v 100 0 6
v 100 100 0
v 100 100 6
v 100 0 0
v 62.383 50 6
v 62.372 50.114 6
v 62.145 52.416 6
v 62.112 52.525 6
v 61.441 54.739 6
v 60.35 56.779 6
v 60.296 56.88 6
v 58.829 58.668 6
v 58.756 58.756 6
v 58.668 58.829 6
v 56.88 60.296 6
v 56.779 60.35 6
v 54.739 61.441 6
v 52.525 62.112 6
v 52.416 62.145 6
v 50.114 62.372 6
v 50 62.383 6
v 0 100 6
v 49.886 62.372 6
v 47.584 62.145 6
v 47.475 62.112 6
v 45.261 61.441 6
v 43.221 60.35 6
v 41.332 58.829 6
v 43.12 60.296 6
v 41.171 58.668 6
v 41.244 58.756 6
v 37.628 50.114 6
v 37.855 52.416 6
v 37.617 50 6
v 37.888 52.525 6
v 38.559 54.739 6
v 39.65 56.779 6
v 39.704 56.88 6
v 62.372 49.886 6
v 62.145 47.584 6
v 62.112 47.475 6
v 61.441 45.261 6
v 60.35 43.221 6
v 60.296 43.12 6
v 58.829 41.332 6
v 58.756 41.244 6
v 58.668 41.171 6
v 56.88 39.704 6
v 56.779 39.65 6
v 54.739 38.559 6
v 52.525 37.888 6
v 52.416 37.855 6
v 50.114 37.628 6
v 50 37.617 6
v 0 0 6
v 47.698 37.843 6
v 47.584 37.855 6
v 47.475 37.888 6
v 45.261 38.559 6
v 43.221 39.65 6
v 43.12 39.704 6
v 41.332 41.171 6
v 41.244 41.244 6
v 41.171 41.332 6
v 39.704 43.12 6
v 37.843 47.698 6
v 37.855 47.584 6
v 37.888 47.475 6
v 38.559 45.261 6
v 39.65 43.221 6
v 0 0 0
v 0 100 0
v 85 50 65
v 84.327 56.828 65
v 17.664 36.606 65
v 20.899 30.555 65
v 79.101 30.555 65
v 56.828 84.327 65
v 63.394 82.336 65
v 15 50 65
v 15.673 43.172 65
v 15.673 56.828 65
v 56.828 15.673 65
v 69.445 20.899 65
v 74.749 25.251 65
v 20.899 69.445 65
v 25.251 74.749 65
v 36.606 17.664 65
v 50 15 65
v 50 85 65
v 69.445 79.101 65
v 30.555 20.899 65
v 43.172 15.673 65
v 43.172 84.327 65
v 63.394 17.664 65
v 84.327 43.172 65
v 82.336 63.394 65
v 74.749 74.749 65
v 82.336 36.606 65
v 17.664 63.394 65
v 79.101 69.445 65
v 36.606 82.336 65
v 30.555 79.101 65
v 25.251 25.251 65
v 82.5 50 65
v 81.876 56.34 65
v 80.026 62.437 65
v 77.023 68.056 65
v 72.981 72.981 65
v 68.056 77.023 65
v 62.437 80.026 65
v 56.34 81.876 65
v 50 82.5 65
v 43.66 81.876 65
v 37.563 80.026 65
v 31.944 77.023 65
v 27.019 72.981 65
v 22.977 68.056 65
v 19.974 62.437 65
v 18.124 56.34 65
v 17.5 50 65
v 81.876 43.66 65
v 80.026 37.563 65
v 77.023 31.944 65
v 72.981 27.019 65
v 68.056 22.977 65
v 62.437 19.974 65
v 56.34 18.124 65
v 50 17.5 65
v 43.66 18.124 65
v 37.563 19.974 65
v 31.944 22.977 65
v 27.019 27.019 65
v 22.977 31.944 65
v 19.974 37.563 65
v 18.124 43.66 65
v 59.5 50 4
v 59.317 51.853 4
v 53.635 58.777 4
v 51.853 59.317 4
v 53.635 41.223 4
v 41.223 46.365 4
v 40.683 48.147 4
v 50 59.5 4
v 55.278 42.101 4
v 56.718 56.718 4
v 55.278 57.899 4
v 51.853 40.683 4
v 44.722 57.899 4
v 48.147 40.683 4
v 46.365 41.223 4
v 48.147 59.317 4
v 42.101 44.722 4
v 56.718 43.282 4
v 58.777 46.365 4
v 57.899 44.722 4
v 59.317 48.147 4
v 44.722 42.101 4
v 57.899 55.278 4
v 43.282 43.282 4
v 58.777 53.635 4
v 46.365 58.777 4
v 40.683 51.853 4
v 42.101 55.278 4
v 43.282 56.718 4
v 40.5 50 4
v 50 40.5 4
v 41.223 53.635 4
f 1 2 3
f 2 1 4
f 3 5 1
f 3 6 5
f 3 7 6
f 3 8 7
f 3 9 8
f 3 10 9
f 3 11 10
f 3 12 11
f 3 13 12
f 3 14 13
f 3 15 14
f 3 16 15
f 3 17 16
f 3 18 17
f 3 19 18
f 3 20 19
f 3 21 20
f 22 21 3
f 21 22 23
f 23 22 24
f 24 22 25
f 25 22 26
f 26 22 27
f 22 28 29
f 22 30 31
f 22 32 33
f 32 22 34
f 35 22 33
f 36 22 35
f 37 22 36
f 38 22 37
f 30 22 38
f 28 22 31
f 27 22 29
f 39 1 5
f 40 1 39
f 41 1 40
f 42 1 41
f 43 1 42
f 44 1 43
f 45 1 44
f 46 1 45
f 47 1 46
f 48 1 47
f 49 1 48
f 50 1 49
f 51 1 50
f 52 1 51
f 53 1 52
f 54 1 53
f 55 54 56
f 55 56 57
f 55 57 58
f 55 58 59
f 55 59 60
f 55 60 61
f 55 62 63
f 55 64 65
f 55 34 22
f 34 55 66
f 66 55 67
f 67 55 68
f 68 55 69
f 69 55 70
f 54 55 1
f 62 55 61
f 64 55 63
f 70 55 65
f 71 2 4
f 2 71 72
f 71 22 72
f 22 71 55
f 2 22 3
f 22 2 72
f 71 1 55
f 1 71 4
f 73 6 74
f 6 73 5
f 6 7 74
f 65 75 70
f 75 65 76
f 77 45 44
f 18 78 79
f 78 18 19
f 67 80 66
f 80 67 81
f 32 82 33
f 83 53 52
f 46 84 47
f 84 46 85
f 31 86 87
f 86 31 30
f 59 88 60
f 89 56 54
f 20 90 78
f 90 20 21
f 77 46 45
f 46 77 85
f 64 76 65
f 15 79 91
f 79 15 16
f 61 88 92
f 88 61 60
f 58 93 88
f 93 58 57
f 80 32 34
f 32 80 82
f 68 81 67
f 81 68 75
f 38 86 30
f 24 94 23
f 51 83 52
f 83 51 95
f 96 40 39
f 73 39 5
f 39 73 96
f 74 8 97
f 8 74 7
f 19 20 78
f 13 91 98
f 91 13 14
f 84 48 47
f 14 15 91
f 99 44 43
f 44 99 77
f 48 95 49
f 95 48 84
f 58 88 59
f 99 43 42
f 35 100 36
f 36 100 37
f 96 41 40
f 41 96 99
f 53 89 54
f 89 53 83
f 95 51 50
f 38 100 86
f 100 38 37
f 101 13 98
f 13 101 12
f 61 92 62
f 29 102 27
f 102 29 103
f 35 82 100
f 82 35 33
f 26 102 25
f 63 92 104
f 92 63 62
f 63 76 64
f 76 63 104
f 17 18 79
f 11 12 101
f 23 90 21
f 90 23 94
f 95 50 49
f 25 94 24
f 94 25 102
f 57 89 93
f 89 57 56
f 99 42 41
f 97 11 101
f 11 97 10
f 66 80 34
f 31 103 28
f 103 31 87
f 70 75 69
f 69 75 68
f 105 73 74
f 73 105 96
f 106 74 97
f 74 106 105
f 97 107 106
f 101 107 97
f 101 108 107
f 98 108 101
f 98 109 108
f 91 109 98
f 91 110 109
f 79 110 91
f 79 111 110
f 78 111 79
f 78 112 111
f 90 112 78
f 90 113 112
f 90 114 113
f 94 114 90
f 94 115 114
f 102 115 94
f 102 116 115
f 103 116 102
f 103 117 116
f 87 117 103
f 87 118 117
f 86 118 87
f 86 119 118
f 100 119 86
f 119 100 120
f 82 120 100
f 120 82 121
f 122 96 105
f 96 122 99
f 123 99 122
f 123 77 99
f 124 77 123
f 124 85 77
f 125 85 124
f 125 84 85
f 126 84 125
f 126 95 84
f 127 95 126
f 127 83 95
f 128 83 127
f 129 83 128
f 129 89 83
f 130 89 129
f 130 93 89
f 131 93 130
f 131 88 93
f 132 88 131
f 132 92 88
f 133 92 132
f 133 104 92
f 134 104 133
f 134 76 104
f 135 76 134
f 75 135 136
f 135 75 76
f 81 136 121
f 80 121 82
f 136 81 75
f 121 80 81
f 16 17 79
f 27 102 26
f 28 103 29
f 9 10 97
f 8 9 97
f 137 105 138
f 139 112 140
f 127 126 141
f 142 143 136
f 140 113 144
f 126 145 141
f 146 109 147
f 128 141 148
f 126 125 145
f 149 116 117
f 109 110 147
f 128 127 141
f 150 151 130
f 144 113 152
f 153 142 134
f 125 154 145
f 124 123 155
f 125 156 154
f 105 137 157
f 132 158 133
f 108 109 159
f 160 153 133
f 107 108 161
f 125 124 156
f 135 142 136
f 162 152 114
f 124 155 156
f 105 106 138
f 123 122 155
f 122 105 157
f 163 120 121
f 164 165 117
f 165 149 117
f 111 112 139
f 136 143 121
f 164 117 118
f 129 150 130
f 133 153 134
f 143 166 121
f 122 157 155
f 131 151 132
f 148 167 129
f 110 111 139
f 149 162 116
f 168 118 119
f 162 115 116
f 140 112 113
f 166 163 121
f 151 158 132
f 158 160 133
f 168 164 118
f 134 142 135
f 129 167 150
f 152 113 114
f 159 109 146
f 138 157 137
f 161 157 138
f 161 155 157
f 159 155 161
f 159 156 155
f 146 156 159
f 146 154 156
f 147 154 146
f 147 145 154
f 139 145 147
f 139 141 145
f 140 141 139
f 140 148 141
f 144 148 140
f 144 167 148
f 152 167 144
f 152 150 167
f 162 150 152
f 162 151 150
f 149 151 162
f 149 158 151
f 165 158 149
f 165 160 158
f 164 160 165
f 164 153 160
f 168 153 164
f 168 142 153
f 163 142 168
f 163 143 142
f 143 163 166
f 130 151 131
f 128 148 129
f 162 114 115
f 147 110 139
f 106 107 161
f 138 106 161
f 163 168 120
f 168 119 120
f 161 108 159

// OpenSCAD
$fn = 32;

// ----------------------------------------------------------------------
// Hopper: funnel with square flange
// ----------------------------------------------------------------------

// --- parameters (mm) ---
fl = 100;                 // flange side, X and Y
fl_t = 6;                 // flange thickness
cone_h = 60;              // cone height above the flange
top_d = 70;               // cone mouth diameter
bot_d = 24;               // cone spout diameter
wall = 2.5;               // cone wall thickness
fit_tol = 0.05;           // tolerance for press fits, mm
free_tol = 0.2;           // tolerance for clearance fits, mm

bore_d = bot_d - 2 * wall;  // spout bore diameter
total_h = fl_t + cone_h - 1;  // overall height

difference() {
  union() {
    cube([fl, fl, fl_t]);
    translate([fl / 2, fl / 2, fl_t - 1])
      cylinder(h = cone_h, d1 = bot_d, d2 = top_d);
  }
  translate([fl / 2, fl / 2, fl_t - 2])
    cylinder(h = cone_h + 1, d1 = bore_d, d2 = top_d - 2 * wall);
}
